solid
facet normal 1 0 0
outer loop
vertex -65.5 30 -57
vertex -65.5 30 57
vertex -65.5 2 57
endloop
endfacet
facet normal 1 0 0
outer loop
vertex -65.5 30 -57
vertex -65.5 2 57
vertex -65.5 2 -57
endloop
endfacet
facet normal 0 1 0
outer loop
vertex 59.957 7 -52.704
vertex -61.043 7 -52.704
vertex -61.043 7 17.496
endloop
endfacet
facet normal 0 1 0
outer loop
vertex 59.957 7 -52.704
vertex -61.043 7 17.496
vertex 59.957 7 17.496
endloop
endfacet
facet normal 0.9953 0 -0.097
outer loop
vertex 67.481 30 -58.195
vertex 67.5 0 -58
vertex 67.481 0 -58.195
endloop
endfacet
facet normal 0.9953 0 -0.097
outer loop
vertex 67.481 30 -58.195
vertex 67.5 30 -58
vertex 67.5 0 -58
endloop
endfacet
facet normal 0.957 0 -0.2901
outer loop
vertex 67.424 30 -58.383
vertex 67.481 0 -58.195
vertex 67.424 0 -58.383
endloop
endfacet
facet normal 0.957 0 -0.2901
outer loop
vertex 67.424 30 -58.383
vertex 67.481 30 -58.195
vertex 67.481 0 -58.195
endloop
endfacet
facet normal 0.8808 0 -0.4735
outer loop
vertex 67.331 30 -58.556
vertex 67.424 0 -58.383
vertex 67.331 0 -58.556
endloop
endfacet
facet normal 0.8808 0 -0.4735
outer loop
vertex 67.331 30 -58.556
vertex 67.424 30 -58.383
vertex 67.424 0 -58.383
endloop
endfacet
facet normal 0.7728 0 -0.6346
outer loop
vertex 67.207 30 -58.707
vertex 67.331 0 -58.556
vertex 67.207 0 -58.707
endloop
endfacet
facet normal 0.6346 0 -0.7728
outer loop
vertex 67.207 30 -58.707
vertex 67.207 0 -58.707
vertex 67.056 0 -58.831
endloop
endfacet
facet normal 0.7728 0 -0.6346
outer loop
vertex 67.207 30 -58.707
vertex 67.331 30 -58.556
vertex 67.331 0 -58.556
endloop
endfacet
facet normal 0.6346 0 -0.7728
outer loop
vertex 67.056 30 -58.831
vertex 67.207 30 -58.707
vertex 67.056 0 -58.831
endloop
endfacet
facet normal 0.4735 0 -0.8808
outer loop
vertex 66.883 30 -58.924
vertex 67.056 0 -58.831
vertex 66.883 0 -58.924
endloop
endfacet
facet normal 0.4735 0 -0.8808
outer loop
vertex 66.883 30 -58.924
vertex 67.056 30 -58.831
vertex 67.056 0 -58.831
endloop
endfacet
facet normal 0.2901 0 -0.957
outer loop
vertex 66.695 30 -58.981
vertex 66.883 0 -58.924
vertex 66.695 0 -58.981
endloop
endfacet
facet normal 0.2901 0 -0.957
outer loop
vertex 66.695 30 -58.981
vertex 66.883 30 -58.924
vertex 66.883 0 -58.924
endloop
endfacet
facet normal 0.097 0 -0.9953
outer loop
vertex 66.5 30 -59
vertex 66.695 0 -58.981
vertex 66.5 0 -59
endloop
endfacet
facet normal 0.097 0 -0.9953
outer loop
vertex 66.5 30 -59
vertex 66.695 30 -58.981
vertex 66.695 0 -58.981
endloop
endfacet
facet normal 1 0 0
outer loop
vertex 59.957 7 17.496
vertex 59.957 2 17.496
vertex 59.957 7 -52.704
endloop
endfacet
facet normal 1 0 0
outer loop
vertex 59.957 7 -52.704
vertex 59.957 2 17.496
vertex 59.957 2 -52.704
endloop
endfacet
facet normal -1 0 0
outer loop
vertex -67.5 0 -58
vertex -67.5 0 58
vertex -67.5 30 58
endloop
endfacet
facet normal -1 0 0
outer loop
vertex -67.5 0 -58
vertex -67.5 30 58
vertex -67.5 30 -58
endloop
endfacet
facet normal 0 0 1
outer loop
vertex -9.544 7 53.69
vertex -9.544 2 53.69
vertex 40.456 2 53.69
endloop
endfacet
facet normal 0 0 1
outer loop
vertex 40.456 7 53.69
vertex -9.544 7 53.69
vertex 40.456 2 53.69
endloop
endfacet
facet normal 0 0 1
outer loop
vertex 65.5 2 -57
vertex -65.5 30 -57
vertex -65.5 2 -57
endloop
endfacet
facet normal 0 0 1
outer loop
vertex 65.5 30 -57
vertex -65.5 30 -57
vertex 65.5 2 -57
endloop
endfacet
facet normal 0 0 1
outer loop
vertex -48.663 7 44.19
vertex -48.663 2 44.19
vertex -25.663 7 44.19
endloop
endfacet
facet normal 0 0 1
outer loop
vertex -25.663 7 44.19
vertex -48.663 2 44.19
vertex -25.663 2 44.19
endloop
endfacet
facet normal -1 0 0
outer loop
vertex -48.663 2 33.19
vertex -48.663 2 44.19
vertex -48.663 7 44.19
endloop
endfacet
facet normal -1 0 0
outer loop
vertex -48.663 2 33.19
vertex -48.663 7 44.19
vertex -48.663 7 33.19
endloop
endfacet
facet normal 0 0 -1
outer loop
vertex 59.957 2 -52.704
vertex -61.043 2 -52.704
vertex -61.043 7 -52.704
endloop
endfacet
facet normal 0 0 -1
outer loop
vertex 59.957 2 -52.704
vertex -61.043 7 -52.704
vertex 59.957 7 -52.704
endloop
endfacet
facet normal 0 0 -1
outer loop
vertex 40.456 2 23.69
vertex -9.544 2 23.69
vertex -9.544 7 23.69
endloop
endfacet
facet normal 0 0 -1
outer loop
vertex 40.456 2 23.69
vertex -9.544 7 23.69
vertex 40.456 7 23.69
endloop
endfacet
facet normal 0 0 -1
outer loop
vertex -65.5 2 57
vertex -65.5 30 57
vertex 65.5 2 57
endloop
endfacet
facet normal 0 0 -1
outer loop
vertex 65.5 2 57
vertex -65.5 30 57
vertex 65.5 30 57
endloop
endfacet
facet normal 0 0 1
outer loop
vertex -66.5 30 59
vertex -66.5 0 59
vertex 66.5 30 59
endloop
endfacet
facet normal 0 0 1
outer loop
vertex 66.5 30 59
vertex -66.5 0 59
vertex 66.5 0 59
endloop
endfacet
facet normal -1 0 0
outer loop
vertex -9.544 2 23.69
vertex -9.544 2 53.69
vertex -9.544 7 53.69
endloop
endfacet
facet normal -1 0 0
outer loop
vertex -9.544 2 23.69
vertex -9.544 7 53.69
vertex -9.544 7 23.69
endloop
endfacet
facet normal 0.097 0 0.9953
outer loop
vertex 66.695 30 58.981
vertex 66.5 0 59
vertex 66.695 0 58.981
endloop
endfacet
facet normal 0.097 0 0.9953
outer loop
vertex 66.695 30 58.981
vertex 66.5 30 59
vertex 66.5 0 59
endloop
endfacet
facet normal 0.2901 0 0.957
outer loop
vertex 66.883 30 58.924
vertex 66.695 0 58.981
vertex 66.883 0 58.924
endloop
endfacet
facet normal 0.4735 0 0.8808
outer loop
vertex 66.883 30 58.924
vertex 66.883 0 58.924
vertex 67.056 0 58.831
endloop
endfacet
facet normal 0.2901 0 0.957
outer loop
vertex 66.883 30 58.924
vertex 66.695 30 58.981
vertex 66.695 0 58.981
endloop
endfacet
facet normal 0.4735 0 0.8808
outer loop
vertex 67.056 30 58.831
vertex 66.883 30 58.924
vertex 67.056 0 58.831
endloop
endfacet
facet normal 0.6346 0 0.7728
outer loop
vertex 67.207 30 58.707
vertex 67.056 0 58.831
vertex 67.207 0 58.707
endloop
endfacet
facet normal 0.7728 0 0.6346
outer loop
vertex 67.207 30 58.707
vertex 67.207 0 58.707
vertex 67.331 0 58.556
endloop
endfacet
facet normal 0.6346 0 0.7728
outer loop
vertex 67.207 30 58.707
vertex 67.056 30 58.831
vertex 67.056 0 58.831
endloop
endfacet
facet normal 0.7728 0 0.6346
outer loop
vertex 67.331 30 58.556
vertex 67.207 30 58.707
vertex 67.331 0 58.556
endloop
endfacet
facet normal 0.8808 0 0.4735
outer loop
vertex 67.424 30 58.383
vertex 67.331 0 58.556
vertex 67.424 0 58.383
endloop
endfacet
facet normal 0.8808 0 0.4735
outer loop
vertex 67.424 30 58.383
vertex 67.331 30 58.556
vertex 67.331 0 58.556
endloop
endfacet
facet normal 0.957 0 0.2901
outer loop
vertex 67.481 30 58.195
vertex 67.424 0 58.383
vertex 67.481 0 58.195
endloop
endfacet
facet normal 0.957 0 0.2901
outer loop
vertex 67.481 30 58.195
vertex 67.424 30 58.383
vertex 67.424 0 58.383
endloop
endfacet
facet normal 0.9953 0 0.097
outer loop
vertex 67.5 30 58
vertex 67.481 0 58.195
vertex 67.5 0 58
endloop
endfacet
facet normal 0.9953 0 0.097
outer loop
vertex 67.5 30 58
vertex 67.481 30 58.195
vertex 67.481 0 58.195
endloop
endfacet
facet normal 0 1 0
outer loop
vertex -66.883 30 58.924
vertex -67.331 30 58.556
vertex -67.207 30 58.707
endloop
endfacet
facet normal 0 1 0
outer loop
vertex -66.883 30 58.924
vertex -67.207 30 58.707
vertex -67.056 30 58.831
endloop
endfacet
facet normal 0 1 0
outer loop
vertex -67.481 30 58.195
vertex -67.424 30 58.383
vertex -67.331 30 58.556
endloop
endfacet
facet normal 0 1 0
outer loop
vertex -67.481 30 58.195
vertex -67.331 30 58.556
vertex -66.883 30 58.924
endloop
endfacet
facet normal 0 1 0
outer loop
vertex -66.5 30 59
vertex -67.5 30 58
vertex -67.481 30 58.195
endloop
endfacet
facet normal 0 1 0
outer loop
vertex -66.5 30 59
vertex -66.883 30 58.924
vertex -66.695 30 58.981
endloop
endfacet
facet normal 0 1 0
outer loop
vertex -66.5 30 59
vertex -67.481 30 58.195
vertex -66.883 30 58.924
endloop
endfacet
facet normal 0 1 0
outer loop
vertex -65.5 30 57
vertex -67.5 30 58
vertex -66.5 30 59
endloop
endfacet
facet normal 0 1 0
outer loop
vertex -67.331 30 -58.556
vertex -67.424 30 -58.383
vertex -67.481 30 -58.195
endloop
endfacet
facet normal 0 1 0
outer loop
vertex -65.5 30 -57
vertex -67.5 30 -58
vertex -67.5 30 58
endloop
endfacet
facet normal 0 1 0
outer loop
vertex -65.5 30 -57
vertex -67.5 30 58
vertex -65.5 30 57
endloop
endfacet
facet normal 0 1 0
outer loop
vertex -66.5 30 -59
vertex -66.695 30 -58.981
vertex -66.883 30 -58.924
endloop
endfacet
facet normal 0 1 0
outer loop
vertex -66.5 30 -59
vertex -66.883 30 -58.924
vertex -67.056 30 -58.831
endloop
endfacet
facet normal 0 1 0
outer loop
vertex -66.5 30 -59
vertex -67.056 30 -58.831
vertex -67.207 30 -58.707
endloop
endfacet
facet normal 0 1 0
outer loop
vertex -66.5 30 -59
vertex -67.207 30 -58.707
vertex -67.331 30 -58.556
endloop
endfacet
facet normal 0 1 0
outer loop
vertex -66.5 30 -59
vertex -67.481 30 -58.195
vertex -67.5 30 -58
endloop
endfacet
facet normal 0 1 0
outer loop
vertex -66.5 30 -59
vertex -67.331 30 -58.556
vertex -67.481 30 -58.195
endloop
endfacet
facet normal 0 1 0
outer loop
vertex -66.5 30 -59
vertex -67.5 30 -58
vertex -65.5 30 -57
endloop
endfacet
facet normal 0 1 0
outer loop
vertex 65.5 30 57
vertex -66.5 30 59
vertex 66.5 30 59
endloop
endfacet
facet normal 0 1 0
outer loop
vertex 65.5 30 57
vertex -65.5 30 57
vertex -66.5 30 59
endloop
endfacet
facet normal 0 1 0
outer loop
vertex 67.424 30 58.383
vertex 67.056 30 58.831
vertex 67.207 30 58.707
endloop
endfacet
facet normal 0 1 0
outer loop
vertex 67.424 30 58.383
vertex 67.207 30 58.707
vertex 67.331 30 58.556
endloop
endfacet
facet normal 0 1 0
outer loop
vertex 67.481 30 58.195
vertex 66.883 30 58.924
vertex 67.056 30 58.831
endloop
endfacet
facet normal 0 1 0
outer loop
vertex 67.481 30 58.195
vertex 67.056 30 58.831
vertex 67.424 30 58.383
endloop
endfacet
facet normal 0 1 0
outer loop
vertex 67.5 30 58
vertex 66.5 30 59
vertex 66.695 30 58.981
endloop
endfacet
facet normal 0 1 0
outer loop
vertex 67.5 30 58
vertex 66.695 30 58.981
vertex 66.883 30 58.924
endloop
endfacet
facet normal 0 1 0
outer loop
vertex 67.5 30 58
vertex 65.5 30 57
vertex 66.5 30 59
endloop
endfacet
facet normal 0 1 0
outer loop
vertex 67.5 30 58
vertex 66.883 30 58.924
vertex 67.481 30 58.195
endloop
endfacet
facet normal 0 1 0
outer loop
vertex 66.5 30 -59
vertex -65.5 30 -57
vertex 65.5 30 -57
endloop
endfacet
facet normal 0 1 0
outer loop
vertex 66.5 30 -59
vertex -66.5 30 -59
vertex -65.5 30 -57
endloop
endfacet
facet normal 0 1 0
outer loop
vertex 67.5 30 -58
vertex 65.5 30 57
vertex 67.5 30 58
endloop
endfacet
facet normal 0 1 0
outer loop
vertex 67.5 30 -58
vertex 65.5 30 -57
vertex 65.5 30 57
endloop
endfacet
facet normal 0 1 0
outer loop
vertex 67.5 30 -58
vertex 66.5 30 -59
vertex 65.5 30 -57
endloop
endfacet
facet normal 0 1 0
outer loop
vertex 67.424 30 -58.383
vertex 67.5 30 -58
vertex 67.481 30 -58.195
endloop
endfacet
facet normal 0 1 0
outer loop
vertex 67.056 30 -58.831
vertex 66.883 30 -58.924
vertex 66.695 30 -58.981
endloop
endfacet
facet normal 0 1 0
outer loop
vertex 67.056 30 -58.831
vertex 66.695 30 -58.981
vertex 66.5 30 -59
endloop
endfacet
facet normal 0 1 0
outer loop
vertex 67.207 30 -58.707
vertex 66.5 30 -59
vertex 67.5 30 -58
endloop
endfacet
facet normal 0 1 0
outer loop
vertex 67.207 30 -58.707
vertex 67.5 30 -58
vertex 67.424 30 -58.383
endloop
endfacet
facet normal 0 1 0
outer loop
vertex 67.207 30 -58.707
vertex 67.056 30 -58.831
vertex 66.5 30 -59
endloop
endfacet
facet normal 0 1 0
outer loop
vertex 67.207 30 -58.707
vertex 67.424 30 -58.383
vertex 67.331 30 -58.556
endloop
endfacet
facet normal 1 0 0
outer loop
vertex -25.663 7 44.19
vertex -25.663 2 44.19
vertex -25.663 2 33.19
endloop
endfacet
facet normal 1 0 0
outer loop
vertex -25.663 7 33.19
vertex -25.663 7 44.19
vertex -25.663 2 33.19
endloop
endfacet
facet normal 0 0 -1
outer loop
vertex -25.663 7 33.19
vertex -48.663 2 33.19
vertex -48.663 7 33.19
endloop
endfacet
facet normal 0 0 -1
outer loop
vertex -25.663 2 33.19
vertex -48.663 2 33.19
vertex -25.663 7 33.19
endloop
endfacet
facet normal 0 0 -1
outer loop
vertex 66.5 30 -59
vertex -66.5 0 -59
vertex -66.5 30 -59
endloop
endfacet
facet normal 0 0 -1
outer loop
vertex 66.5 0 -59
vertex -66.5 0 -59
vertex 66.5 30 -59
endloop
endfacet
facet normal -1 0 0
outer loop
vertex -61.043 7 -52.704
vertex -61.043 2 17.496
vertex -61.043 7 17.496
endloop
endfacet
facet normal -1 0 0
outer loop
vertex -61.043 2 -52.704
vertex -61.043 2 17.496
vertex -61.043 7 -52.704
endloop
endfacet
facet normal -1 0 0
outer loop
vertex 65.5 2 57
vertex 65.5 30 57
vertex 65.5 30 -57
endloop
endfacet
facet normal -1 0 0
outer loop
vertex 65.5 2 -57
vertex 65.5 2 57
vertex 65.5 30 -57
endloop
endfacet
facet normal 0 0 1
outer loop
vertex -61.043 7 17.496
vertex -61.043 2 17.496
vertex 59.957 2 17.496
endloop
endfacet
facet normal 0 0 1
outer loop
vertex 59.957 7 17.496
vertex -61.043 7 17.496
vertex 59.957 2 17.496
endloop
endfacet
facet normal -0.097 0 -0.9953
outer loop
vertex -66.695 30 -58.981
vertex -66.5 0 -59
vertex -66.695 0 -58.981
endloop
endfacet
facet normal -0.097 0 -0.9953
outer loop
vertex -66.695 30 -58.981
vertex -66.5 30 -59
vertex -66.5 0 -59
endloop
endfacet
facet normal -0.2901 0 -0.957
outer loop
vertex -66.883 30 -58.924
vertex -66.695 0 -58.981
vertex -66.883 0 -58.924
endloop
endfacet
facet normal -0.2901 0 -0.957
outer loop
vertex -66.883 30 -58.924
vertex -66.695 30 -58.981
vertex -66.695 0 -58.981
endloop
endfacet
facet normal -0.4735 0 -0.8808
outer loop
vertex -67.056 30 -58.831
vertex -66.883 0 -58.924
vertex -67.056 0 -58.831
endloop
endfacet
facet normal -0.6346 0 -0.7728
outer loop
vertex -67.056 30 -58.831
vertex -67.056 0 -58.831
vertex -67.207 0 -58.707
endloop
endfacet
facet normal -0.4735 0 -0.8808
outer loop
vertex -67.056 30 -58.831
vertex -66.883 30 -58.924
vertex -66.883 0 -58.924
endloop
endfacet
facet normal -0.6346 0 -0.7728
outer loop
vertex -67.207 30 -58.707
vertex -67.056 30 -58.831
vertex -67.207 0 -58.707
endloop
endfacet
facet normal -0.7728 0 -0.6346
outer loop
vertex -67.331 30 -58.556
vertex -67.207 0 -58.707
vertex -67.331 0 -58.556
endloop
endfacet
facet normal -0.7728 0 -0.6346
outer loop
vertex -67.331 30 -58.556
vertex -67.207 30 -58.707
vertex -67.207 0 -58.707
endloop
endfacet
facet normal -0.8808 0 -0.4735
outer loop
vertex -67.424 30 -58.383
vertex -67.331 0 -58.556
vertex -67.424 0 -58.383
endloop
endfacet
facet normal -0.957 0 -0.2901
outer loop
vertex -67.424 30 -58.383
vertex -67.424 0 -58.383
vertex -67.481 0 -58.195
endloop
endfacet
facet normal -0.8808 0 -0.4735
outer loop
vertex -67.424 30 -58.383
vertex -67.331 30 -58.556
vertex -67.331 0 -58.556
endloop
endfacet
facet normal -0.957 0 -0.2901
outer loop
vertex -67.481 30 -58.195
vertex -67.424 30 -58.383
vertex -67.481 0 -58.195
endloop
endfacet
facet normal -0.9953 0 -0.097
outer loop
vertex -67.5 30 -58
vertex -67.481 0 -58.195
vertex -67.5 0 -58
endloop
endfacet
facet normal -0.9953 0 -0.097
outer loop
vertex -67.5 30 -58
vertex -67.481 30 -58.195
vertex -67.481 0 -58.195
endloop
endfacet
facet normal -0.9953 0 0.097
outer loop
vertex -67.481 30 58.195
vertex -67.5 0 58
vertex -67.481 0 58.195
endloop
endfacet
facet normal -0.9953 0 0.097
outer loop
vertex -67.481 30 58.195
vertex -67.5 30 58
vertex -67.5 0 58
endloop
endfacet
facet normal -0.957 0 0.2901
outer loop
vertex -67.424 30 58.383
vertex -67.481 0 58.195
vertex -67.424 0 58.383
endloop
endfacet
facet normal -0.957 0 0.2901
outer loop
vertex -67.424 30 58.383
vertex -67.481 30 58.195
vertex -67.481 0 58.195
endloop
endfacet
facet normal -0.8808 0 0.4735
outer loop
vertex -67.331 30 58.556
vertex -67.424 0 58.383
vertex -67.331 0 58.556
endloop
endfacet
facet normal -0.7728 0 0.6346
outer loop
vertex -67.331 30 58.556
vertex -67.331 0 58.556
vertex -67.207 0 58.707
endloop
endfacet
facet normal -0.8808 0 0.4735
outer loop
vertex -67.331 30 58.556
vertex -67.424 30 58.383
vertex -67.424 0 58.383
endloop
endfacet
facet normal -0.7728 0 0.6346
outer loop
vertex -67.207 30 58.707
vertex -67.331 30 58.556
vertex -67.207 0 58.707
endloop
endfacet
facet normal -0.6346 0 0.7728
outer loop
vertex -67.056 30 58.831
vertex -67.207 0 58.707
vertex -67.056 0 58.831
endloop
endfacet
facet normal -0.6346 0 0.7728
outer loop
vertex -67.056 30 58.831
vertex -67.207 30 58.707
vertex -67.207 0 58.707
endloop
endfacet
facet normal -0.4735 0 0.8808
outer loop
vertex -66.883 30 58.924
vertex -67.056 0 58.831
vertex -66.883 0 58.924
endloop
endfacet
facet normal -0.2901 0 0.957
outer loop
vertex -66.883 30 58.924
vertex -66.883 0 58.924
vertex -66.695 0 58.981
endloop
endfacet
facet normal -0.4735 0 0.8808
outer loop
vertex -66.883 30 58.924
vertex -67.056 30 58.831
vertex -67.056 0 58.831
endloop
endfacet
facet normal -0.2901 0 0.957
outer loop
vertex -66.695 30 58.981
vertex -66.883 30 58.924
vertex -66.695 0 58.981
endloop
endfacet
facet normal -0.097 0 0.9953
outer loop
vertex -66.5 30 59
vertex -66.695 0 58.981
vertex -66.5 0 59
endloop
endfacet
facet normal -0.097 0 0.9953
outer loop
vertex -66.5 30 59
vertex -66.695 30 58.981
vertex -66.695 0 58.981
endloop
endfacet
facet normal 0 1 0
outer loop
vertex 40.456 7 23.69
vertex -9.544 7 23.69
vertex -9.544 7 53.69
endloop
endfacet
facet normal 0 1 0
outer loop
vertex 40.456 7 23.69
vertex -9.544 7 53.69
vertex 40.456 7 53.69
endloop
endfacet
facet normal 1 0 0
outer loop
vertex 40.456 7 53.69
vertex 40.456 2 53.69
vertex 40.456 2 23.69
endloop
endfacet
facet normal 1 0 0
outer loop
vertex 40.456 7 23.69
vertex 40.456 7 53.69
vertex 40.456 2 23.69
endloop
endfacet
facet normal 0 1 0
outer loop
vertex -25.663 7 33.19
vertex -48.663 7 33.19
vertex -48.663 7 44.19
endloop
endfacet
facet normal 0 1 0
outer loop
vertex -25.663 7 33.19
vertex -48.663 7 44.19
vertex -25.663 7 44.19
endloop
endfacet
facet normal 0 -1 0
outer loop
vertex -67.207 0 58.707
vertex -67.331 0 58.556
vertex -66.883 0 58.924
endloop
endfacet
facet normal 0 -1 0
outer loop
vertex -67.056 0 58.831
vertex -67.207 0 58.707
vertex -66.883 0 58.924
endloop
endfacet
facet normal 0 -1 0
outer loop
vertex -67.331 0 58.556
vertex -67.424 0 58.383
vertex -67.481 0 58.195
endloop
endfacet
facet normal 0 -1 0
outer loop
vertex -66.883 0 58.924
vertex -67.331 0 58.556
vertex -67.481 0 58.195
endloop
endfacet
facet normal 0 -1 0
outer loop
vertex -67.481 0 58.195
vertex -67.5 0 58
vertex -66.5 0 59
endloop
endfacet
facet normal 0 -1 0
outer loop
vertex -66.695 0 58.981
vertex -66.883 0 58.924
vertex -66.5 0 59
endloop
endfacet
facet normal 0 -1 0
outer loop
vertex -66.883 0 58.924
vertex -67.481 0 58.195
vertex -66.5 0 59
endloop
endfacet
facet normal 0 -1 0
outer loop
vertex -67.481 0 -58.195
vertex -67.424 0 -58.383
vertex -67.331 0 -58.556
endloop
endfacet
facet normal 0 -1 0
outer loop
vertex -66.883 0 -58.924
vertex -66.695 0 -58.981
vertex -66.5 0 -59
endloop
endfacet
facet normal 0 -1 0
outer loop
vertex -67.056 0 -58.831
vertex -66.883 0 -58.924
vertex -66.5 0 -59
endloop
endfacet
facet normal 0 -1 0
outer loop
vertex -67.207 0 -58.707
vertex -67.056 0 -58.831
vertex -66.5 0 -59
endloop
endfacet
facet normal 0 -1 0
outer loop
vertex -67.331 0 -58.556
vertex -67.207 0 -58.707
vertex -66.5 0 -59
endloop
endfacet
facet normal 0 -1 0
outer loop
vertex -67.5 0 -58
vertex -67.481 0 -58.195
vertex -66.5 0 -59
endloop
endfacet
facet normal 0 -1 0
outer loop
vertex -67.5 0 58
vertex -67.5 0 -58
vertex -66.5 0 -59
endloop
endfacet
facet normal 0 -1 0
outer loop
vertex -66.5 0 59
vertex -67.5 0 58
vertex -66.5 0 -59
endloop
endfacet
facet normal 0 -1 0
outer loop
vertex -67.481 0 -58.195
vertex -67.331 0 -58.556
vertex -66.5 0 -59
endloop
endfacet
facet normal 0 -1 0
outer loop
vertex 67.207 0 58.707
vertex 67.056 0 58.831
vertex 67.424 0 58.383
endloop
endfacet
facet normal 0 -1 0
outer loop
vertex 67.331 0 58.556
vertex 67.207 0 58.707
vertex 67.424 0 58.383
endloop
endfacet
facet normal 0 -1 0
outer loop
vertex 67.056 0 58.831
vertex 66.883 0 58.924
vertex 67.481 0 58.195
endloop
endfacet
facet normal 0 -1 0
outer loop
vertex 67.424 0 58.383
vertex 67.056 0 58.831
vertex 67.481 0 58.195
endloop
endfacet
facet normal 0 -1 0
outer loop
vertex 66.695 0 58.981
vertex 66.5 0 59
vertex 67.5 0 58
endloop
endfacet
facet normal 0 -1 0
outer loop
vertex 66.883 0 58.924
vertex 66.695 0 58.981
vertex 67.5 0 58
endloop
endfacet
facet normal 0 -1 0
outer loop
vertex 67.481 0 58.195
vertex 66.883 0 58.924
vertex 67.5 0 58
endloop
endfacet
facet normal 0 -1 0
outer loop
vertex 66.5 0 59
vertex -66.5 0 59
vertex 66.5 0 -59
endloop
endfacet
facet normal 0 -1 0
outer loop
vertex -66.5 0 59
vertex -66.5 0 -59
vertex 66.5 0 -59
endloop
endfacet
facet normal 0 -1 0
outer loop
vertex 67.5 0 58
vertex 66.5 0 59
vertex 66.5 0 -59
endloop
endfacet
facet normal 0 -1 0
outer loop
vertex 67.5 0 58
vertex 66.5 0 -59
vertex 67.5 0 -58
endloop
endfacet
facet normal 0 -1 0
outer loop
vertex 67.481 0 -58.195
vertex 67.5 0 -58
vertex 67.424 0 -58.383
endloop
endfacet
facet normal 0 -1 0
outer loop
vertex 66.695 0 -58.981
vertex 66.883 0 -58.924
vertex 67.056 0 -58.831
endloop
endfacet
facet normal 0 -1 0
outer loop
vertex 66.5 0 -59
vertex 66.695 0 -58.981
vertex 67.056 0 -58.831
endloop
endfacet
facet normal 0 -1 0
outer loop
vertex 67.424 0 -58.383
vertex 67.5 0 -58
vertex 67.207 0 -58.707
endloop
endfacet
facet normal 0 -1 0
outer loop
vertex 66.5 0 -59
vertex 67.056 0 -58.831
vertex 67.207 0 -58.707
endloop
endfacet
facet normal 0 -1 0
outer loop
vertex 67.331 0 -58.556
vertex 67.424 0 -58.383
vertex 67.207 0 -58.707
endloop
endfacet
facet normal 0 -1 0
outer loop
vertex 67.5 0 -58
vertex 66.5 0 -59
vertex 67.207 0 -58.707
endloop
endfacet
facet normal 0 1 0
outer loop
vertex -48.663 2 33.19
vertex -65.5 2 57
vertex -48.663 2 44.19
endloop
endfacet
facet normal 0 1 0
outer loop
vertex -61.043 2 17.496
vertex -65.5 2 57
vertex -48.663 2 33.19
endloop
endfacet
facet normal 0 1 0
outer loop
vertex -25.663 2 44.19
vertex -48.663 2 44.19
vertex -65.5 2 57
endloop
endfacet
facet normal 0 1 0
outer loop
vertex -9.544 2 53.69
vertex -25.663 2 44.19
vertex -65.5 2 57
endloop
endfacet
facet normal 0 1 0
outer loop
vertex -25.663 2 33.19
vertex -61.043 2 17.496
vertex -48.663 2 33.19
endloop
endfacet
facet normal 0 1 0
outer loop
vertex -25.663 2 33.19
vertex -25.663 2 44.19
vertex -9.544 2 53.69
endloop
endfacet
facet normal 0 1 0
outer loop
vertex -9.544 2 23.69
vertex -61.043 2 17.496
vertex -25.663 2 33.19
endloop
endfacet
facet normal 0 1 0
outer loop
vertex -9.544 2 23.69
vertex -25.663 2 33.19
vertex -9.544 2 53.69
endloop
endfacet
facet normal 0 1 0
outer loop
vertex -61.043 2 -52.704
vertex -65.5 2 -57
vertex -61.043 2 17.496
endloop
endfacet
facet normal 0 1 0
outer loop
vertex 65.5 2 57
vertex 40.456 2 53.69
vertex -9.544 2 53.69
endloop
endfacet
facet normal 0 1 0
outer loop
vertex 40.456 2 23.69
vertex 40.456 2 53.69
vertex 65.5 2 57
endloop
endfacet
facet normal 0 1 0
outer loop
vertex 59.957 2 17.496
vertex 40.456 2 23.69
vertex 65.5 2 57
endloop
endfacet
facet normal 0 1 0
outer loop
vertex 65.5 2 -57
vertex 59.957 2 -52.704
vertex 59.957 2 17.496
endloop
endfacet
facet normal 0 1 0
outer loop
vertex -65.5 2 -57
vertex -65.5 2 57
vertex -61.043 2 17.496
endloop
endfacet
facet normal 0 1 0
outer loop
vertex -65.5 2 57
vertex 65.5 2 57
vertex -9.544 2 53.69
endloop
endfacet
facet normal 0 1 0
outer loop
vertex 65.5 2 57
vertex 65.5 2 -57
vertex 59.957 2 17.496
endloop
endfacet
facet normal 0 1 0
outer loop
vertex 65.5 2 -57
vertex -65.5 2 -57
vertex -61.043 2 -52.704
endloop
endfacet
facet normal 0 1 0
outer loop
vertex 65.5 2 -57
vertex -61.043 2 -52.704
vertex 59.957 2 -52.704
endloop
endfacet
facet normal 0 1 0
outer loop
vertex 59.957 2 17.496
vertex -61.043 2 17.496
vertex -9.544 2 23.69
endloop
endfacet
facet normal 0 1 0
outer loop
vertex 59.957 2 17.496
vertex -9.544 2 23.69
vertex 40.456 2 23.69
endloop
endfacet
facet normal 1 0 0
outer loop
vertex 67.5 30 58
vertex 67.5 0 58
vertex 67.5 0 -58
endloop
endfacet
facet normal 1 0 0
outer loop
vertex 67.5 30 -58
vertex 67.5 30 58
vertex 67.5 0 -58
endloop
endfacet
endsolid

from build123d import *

# Parameters (mm, degrees)
SKETCH3_W           = 135
SKETCH3_H           = 118
BOSS_EXTRUDE1_DEPTH = 30
SKETCH4_W           = 131
SKETCH4_H           = 114
CUT_EXTRUDE1_DEPTH  = 28
SKETCH6_W           = 121
SKETCH6_H           = 70.2
SKETCH6_W_2         = 23
SKETCH6_H_2         = 11
SKETCH6_W_3         = 50
SKETCH6_H_3         = 30
BOSS_EXTRUDE2_DEPTH = 5
FILLET1_R           = 1
FILLET2_R           = 1
FILLET3_R           = 1
FILLET4_R           = 1


with BuildPart() as part:
    # Sketch3 → Boss-Extrude1 (new body)
    with BuildSketch(Plane(origin=(0, 0, 0), x_dir=(1, 0, 0), z_dir=(0, 1, 0))):
        Rectangle(SKETCH3_W, SKETCH3_H)
    extrude(amount=BOSS_EXTRUDE1_DEPTH)

    # Sketch4 → Cut-Extrude1 (cut)
    with BuildSketch(Plane(origin=(0, 30, 0), x_dir=(1, 0, 0), z_dir=(0, 1, 0))):
        Rectangle(SKETCH4_W, SKETCH4_H)
    extrude(amount=-CUT_EXTRUDE1_DEPTH, mode=Mode.SUBTRACT)

    # Sketch6 → Boss-Extrude2 (add)
    with BuildSketch(Plane(origin=(0, 2, 0), x_dir=(1, 0, 0), z_dir=(0, 1, 0))):
        with Locations((-0.543145458, 17.603777785)):
            Rectangle(SKETCH6_W, SKETCH6_H)
        with Locations((-37.163103621, -38.689582539)):
            Rectangle(SKETCH6_W_2, SKETCH6_H_2)
        with Locations((15.455951062, -38.689582539)):
            Rectangle(SKETCH6_W_3, SKETCH6_H_3)
    extrude(amount=BOSS_EXTRUDE2_DEPTH)

    # Fillet1
    fillet1_edges = [part.edges().sort_by_distance(p)[0] for p in [
        (-67.5, 15, 59),
    ]]
    fillet(fillet1_edges, radius=FILLET1_R)

    # Fillet2
    fillet2_edges = [part.edges().sort_by_distance(p)[0] for p in [
        (67.5, 15, 59),
    ]]
    fillet(fillet2_edges, radius=FILLET2_R)

    # Fillet3
    fillet3_edges = [part.edges().sort_by_distance(p)[0] for p in [
        (67.5, 15, -59),
    ]]
    fillet(fillet3_edges, radius=FILLET3_R)

    # Fillet4
    fillet4_edges = [part.edges().sort_by_distance(p)[0] for p in [
        (-67.5, 15, -59),
    ]]
    fillet(fillet4_edges, radius=FILLET4_R)


solid = part.part
